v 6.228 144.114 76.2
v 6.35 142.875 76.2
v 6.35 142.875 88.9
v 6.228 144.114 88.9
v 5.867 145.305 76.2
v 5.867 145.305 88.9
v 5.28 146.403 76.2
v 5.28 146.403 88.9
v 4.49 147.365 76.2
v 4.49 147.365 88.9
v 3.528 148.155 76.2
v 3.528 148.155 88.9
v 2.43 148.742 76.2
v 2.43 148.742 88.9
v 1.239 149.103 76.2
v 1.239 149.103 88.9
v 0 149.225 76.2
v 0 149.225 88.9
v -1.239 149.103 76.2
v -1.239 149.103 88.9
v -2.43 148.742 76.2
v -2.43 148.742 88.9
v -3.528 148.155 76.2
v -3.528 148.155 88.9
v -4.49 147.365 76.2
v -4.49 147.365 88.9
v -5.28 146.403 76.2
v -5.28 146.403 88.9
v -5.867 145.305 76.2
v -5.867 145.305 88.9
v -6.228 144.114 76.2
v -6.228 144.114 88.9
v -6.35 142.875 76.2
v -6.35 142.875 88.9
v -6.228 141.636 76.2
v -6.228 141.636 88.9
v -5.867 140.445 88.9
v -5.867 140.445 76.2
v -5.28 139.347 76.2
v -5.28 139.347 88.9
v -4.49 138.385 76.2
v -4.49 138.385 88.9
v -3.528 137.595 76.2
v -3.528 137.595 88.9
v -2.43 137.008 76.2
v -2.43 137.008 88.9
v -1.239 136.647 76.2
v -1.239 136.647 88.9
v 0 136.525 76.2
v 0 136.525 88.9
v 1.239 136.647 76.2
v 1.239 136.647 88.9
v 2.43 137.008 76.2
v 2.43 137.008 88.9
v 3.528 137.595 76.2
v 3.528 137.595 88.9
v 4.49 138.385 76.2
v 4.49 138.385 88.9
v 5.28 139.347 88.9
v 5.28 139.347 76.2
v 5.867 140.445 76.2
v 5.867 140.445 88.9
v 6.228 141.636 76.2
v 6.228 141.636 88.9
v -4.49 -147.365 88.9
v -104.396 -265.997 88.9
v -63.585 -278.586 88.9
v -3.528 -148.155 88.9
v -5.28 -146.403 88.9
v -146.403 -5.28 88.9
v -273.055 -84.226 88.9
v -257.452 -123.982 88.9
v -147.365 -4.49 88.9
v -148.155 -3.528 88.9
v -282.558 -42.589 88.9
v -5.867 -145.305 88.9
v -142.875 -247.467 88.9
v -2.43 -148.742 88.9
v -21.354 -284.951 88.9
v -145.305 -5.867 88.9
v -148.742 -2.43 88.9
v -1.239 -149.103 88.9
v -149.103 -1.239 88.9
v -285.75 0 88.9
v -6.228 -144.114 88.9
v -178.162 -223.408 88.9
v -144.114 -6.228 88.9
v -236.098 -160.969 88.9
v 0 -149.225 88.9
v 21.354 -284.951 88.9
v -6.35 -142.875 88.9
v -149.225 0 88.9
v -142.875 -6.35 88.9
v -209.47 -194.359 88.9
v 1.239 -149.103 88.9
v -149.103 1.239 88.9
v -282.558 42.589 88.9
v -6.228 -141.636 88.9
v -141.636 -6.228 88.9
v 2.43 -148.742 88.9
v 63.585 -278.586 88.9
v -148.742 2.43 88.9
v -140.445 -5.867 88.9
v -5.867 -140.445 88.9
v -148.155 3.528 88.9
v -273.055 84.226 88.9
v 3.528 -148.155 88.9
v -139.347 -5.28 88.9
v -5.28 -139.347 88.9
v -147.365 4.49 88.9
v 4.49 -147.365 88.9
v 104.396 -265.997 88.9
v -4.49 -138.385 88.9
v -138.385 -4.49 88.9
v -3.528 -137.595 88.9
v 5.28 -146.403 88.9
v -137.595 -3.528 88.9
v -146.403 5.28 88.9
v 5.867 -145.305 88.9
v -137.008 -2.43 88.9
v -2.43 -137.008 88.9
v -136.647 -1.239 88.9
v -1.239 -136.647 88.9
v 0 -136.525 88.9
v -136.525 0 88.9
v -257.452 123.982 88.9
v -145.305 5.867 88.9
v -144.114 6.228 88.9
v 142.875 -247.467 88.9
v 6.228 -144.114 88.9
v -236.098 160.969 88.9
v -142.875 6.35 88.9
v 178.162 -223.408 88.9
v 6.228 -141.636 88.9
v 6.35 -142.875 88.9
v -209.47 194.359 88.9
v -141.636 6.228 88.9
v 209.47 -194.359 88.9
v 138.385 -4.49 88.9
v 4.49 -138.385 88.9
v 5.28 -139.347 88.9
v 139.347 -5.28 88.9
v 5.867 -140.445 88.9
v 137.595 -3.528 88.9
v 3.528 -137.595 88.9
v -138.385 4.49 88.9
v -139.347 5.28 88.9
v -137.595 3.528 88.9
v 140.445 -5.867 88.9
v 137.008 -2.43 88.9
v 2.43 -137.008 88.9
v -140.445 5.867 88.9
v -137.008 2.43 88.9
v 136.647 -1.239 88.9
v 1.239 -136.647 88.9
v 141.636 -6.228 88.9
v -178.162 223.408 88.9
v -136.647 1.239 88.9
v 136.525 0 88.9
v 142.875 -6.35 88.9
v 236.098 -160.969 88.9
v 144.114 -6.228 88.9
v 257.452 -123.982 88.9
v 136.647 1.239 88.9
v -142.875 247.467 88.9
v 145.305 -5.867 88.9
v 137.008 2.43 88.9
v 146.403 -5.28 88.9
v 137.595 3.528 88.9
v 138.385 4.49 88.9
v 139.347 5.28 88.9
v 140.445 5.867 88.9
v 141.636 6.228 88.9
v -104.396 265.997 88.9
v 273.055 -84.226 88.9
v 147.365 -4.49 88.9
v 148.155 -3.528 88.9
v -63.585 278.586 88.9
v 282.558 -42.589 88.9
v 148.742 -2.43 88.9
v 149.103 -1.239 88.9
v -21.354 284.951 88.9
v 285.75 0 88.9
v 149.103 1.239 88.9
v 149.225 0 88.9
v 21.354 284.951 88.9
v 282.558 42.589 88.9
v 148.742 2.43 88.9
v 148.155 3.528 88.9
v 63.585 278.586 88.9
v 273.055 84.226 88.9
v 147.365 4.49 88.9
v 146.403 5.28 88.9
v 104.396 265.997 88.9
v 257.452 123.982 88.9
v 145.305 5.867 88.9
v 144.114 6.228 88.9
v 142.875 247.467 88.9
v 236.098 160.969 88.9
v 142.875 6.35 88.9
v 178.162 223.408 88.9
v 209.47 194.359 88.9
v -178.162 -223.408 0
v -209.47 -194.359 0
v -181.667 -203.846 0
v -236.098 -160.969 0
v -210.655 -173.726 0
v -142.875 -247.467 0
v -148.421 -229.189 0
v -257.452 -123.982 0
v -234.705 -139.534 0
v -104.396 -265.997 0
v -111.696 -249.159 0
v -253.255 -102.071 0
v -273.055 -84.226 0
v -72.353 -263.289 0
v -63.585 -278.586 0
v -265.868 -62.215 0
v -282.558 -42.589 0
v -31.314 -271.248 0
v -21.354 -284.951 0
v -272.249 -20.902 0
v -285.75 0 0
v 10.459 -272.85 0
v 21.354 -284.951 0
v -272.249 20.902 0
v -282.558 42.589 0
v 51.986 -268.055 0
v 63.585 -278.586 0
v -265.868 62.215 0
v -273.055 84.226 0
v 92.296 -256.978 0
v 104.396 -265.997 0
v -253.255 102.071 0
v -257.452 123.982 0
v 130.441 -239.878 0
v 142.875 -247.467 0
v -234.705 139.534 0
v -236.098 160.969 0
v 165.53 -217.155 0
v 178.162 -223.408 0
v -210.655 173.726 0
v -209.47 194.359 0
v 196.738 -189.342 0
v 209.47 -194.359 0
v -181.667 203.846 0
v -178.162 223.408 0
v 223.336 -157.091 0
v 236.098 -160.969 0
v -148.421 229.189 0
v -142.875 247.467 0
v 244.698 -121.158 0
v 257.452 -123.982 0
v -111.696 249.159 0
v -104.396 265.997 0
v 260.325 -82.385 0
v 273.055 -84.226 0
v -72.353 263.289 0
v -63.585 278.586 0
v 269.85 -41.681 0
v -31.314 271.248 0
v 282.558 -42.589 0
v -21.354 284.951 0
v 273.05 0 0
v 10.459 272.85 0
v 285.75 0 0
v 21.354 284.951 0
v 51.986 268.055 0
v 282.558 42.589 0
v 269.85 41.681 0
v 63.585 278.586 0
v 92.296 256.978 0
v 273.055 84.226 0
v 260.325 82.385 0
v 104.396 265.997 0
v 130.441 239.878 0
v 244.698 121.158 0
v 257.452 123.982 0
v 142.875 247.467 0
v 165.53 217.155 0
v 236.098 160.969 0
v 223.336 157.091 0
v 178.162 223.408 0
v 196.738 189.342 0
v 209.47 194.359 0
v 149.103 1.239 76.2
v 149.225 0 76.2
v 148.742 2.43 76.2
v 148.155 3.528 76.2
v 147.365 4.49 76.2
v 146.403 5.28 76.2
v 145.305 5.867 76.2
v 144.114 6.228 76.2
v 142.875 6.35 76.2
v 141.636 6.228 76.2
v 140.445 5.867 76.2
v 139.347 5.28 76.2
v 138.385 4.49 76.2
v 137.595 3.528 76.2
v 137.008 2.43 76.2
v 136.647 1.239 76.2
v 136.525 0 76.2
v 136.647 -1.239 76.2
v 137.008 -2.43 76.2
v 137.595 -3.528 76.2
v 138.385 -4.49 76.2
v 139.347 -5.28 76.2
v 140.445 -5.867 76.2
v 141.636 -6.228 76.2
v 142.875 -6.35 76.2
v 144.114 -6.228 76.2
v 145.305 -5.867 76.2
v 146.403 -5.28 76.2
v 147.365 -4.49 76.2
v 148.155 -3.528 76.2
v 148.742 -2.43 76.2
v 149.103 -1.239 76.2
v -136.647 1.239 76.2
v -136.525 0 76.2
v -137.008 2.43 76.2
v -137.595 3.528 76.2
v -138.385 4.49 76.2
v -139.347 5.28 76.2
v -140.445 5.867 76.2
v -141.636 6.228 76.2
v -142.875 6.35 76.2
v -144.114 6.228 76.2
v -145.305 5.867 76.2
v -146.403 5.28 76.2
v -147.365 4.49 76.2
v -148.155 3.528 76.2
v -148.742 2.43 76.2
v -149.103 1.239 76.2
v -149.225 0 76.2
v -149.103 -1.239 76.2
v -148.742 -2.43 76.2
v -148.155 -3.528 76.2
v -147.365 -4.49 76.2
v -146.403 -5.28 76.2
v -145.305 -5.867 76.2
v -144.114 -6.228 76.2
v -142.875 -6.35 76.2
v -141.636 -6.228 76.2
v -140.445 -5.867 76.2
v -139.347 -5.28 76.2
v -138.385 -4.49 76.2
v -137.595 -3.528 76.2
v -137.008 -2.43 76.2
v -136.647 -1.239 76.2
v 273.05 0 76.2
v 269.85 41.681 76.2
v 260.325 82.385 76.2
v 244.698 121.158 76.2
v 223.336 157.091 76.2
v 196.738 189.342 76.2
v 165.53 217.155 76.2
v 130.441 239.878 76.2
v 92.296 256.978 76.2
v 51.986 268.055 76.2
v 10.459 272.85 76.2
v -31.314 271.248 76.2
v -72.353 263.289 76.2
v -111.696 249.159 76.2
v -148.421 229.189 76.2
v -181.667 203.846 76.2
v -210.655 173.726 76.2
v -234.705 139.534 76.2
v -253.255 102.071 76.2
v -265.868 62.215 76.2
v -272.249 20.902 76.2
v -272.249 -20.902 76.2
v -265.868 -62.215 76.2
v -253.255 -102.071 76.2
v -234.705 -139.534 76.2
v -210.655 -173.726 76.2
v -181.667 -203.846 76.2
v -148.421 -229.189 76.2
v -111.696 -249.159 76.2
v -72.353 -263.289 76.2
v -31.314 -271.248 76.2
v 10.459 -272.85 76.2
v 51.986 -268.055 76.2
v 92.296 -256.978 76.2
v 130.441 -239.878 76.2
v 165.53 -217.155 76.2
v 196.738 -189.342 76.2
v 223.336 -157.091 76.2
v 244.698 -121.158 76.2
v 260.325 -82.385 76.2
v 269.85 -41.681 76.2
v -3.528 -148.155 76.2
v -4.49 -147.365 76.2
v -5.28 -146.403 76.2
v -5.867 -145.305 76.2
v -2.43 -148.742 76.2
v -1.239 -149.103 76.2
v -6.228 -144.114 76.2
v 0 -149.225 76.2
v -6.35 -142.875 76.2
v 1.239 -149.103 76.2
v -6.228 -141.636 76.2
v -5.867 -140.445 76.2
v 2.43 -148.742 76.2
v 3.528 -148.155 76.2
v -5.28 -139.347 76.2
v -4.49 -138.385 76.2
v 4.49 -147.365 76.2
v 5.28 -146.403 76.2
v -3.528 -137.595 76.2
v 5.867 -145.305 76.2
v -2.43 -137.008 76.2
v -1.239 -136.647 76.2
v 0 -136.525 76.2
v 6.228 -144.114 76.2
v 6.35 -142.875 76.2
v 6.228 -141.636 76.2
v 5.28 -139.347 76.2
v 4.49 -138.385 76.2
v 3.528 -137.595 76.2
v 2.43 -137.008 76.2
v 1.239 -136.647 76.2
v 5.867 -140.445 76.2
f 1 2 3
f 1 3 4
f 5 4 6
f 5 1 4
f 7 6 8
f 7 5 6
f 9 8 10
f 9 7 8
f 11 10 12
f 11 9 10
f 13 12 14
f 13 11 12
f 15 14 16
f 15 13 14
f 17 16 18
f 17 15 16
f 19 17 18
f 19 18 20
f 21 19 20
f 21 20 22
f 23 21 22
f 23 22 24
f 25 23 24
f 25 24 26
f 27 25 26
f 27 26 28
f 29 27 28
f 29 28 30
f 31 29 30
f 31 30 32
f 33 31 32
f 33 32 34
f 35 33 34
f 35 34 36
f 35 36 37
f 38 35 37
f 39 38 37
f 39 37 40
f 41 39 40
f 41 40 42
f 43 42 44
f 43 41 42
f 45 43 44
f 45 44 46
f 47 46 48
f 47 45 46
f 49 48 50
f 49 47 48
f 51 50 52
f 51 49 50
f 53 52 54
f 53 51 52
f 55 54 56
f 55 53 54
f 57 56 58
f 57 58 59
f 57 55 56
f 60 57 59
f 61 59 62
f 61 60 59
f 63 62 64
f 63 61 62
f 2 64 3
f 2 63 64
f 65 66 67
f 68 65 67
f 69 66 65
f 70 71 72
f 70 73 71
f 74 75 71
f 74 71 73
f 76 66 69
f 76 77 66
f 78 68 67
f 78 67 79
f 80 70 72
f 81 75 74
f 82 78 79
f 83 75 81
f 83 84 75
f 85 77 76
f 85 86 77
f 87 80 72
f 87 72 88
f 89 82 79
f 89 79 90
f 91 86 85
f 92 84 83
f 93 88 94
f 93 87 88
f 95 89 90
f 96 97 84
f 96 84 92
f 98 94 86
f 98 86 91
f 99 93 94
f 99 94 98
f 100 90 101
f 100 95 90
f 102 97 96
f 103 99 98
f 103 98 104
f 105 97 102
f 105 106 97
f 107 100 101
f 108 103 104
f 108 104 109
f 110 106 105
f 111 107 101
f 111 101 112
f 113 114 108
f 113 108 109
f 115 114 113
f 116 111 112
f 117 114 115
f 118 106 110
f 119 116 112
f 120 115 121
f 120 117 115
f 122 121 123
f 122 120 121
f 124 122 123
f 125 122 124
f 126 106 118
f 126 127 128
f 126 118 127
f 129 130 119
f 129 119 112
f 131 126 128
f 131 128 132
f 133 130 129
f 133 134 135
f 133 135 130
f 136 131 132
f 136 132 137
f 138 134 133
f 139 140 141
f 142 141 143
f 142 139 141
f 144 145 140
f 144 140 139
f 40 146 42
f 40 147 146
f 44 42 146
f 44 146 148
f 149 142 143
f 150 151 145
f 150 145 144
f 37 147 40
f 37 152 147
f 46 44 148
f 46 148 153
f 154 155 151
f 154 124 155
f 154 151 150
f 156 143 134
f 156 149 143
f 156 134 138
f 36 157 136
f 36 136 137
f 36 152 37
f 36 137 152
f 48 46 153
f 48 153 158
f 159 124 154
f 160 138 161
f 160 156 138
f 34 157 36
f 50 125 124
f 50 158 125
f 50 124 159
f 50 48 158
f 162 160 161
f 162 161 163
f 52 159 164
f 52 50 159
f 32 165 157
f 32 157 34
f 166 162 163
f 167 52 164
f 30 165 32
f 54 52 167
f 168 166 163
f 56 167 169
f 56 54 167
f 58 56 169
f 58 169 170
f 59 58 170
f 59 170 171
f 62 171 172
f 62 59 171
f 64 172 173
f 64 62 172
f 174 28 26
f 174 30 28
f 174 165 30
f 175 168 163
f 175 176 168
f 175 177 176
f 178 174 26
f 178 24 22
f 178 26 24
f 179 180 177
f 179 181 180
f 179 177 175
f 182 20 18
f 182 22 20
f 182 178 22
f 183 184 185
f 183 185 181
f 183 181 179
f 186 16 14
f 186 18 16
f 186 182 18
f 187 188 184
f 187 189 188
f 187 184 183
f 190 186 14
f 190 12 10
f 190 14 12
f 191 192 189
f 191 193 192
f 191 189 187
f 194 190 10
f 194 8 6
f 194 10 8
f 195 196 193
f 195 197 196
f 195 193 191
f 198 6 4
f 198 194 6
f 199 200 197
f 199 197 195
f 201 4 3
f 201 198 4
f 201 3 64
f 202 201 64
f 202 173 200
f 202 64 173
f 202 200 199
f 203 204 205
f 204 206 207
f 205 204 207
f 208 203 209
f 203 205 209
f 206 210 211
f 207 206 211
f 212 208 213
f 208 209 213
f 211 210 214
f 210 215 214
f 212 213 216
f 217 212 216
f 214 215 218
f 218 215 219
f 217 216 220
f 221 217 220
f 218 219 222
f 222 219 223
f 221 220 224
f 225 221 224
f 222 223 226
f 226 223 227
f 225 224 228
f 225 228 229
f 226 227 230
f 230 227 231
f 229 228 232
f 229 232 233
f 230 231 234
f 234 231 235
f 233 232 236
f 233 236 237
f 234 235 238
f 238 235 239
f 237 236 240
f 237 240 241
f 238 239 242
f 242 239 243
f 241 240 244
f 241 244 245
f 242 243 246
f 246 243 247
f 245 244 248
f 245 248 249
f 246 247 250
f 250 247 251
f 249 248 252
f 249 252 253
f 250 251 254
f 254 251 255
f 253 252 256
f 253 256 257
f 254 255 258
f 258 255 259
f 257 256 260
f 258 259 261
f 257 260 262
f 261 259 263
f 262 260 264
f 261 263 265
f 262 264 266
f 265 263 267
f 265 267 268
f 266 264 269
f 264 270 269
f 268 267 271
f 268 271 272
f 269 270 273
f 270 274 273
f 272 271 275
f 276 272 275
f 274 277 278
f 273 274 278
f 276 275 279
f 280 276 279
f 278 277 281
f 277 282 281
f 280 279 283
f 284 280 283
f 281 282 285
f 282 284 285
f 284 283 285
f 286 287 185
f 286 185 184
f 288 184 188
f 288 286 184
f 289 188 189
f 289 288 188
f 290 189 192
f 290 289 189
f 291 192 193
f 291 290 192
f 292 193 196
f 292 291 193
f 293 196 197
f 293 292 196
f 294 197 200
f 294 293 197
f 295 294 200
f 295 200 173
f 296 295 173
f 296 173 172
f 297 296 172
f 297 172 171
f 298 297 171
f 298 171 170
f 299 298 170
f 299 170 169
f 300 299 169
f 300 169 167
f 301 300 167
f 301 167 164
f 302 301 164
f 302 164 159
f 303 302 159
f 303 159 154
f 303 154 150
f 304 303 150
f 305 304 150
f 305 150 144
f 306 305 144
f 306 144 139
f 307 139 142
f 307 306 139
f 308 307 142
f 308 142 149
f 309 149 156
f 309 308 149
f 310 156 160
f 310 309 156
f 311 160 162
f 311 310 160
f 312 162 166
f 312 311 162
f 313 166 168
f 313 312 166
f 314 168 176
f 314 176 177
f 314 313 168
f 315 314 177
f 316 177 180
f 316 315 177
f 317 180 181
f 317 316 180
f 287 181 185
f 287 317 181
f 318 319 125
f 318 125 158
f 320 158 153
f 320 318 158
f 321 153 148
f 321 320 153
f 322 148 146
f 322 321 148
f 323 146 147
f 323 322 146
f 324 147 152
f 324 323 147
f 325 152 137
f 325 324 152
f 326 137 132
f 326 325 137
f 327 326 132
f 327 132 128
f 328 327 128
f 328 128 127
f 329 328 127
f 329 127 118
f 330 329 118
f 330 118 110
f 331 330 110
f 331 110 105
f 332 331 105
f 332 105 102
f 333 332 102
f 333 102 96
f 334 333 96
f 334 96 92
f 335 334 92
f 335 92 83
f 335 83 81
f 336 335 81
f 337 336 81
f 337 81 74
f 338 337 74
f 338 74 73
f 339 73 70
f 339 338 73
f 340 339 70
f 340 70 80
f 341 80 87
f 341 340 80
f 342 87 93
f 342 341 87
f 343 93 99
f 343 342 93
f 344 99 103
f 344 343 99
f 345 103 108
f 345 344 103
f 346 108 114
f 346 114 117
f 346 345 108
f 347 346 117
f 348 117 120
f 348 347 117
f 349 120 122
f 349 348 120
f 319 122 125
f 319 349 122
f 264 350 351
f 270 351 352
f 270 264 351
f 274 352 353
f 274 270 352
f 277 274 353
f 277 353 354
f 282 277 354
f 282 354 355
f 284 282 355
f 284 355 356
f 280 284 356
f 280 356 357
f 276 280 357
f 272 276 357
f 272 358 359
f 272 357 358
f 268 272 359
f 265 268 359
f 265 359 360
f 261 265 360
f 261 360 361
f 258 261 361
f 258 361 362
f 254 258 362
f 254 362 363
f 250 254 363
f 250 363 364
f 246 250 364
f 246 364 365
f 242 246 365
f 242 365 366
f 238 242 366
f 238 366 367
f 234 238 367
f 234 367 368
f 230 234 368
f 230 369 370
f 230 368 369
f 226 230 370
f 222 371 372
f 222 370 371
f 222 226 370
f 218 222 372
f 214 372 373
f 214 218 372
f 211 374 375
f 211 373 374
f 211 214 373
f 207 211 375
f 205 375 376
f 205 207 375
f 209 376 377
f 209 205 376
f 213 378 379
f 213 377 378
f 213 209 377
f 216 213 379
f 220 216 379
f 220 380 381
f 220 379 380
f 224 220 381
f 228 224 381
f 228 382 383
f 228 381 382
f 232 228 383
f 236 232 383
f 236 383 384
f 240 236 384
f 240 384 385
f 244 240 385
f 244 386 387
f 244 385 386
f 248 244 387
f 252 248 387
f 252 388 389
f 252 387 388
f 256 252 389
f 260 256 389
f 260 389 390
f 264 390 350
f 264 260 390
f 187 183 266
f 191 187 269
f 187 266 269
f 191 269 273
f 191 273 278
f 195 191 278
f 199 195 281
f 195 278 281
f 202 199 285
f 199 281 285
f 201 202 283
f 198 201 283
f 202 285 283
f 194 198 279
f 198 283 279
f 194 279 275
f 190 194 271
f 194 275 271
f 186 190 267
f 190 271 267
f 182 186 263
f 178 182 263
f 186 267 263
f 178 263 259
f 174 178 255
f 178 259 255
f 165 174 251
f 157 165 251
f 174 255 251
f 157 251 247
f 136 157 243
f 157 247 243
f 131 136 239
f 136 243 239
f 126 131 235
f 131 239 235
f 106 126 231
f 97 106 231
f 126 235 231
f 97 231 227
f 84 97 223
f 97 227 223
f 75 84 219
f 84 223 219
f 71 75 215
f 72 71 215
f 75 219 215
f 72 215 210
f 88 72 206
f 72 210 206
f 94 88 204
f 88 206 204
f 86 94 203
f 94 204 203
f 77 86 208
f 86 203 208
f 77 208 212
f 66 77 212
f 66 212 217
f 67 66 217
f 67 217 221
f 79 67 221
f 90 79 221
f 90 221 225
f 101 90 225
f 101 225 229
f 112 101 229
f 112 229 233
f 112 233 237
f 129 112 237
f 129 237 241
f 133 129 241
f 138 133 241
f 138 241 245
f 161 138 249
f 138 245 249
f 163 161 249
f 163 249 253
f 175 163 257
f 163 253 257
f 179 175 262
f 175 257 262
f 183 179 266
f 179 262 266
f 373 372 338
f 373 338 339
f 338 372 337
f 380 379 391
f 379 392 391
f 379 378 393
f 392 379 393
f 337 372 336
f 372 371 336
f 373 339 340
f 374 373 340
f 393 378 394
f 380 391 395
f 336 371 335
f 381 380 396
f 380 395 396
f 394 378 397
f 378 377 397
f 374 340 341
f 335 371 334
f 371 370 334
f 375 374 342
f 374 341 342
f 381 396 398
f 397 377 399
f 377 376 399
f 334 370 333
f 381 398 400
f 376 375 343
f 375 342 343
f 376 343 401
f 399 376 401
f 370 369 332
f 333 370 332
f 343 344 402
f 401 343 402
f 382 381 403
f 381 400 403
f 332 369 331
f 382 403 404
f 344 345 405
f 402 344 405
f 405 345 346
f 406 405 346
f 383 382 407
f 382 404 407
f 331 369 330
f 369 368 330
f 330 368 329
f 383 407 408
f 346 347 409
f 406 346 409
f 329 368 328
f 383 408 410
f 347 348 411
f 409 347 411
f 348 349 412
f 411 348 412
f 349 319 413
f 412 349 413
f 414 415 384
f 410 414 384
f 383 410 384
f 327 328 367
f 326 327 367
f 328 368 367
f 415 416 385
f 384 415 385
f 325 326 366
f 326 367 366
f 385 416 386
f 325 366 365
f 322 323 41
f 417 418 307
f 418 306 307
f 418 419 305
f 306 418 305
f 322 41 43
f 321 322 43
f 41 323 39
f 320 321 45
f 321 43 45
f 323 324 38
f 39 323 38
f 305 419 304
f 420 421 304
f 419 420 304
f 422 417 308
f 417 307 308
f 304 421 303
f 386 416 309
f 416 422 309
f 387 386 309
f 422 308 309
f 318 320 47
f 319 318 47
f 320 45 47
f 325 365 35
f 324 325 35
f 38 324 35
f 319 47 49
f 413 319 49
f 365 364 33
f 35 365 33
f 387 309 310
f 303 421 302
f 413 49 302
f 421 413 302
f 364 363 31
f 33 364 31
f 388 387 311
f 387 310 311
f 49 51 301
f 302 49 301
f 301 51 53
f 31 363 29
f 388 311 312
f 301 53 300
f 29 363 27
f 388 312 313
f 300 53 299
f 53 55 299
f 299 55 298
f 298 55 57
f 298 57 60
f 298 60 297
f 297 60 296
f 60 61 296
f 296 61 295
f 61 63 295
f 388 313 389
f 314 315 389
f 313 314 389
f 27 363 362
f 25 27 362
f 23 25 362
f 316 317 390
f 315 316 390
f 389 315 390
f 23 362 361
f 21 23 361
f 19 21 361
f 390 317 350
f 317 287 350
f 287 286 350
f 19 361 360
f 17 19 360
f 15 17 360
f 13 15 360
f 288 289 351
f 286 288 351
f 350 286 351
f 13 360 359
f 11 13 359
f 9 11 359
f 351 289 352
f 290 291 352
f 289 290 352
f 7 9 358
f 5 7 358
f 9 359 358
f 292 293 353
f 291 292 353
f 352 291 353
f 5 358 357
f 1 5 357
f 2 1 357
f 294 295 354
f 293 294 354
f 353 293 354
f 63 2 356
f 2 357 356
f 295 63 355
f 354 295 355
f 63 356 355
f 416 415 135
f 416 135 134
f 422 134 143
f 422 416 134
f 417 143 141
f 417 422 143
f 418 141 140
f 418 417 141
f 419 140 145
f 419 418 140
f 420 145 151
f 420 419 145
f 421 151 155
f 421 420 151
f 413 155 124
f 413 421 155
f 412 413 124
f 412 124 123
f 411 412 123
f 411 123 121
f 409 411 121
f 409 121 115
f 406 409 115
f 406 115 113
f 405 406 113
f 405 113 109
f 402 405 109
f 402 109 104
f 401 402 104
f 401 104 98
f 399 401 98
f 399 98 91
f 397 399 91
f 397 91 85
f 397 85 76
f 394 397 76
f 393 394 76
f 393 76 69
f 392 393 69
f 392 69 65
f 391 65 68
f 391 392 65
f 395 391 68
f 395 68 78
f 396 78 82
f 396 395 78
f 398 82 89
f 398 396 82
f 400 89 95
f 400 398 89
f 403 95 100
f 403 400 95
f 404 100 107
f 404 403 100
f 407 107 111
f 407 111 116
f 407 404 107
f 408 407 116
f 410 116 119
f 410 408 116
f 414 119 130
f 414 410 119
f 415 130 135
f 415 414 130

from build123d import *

# Parameters (mm, degrees)
F0_R     = 285.75
F0_R_2   = 6.35
F1_DEPTH = 88.9
F2_T     = -12.7
F3_R     = 210.508392
F4_DEPTH = 161.544


with BuildPart() as f1:
    # F0 (on Top) → F1 (new body)
    with BuildSketch(Plane.XY):
        Circle(F0_R)
        with Locations((0, -142.875)):
            Circle(F0_R_2, mode=Mode.SUBTRACT)
        with Locations((-142.875, 0)):
            Circle(F0_R_2, mode=Mode.SUBTRACT)
        with Locations((142.875, 0)):
            Circle(F0_R_2, mode=Mode.SUBTRACT)
        with Locations((0, 142.875)):
            Circle(F0_R_2, mode=Mode.SUBTRACT)
    extrude(amount=F1_DEPTH)

    # F2
    f2_openings = [f1.faces().sort_by_distance(p)[0] for p in [
        (0, 0, 0),
    ]]
    offset(amount=F2_T, openings=f2_openings)

    # F3 (on face) → F4 (cut)
    with BuildSketch(Plane(origin=(0, 0, 76.2), x_dir=(1, 0, 0), z_dir=(0, 0, -1))):
        with Locations((25.252376, -5.049415)):
            Circle(F3_R)
    extrude(amount=F4_DEPTH, mode=Mode.SUBTRACT)


solid = f1.part
